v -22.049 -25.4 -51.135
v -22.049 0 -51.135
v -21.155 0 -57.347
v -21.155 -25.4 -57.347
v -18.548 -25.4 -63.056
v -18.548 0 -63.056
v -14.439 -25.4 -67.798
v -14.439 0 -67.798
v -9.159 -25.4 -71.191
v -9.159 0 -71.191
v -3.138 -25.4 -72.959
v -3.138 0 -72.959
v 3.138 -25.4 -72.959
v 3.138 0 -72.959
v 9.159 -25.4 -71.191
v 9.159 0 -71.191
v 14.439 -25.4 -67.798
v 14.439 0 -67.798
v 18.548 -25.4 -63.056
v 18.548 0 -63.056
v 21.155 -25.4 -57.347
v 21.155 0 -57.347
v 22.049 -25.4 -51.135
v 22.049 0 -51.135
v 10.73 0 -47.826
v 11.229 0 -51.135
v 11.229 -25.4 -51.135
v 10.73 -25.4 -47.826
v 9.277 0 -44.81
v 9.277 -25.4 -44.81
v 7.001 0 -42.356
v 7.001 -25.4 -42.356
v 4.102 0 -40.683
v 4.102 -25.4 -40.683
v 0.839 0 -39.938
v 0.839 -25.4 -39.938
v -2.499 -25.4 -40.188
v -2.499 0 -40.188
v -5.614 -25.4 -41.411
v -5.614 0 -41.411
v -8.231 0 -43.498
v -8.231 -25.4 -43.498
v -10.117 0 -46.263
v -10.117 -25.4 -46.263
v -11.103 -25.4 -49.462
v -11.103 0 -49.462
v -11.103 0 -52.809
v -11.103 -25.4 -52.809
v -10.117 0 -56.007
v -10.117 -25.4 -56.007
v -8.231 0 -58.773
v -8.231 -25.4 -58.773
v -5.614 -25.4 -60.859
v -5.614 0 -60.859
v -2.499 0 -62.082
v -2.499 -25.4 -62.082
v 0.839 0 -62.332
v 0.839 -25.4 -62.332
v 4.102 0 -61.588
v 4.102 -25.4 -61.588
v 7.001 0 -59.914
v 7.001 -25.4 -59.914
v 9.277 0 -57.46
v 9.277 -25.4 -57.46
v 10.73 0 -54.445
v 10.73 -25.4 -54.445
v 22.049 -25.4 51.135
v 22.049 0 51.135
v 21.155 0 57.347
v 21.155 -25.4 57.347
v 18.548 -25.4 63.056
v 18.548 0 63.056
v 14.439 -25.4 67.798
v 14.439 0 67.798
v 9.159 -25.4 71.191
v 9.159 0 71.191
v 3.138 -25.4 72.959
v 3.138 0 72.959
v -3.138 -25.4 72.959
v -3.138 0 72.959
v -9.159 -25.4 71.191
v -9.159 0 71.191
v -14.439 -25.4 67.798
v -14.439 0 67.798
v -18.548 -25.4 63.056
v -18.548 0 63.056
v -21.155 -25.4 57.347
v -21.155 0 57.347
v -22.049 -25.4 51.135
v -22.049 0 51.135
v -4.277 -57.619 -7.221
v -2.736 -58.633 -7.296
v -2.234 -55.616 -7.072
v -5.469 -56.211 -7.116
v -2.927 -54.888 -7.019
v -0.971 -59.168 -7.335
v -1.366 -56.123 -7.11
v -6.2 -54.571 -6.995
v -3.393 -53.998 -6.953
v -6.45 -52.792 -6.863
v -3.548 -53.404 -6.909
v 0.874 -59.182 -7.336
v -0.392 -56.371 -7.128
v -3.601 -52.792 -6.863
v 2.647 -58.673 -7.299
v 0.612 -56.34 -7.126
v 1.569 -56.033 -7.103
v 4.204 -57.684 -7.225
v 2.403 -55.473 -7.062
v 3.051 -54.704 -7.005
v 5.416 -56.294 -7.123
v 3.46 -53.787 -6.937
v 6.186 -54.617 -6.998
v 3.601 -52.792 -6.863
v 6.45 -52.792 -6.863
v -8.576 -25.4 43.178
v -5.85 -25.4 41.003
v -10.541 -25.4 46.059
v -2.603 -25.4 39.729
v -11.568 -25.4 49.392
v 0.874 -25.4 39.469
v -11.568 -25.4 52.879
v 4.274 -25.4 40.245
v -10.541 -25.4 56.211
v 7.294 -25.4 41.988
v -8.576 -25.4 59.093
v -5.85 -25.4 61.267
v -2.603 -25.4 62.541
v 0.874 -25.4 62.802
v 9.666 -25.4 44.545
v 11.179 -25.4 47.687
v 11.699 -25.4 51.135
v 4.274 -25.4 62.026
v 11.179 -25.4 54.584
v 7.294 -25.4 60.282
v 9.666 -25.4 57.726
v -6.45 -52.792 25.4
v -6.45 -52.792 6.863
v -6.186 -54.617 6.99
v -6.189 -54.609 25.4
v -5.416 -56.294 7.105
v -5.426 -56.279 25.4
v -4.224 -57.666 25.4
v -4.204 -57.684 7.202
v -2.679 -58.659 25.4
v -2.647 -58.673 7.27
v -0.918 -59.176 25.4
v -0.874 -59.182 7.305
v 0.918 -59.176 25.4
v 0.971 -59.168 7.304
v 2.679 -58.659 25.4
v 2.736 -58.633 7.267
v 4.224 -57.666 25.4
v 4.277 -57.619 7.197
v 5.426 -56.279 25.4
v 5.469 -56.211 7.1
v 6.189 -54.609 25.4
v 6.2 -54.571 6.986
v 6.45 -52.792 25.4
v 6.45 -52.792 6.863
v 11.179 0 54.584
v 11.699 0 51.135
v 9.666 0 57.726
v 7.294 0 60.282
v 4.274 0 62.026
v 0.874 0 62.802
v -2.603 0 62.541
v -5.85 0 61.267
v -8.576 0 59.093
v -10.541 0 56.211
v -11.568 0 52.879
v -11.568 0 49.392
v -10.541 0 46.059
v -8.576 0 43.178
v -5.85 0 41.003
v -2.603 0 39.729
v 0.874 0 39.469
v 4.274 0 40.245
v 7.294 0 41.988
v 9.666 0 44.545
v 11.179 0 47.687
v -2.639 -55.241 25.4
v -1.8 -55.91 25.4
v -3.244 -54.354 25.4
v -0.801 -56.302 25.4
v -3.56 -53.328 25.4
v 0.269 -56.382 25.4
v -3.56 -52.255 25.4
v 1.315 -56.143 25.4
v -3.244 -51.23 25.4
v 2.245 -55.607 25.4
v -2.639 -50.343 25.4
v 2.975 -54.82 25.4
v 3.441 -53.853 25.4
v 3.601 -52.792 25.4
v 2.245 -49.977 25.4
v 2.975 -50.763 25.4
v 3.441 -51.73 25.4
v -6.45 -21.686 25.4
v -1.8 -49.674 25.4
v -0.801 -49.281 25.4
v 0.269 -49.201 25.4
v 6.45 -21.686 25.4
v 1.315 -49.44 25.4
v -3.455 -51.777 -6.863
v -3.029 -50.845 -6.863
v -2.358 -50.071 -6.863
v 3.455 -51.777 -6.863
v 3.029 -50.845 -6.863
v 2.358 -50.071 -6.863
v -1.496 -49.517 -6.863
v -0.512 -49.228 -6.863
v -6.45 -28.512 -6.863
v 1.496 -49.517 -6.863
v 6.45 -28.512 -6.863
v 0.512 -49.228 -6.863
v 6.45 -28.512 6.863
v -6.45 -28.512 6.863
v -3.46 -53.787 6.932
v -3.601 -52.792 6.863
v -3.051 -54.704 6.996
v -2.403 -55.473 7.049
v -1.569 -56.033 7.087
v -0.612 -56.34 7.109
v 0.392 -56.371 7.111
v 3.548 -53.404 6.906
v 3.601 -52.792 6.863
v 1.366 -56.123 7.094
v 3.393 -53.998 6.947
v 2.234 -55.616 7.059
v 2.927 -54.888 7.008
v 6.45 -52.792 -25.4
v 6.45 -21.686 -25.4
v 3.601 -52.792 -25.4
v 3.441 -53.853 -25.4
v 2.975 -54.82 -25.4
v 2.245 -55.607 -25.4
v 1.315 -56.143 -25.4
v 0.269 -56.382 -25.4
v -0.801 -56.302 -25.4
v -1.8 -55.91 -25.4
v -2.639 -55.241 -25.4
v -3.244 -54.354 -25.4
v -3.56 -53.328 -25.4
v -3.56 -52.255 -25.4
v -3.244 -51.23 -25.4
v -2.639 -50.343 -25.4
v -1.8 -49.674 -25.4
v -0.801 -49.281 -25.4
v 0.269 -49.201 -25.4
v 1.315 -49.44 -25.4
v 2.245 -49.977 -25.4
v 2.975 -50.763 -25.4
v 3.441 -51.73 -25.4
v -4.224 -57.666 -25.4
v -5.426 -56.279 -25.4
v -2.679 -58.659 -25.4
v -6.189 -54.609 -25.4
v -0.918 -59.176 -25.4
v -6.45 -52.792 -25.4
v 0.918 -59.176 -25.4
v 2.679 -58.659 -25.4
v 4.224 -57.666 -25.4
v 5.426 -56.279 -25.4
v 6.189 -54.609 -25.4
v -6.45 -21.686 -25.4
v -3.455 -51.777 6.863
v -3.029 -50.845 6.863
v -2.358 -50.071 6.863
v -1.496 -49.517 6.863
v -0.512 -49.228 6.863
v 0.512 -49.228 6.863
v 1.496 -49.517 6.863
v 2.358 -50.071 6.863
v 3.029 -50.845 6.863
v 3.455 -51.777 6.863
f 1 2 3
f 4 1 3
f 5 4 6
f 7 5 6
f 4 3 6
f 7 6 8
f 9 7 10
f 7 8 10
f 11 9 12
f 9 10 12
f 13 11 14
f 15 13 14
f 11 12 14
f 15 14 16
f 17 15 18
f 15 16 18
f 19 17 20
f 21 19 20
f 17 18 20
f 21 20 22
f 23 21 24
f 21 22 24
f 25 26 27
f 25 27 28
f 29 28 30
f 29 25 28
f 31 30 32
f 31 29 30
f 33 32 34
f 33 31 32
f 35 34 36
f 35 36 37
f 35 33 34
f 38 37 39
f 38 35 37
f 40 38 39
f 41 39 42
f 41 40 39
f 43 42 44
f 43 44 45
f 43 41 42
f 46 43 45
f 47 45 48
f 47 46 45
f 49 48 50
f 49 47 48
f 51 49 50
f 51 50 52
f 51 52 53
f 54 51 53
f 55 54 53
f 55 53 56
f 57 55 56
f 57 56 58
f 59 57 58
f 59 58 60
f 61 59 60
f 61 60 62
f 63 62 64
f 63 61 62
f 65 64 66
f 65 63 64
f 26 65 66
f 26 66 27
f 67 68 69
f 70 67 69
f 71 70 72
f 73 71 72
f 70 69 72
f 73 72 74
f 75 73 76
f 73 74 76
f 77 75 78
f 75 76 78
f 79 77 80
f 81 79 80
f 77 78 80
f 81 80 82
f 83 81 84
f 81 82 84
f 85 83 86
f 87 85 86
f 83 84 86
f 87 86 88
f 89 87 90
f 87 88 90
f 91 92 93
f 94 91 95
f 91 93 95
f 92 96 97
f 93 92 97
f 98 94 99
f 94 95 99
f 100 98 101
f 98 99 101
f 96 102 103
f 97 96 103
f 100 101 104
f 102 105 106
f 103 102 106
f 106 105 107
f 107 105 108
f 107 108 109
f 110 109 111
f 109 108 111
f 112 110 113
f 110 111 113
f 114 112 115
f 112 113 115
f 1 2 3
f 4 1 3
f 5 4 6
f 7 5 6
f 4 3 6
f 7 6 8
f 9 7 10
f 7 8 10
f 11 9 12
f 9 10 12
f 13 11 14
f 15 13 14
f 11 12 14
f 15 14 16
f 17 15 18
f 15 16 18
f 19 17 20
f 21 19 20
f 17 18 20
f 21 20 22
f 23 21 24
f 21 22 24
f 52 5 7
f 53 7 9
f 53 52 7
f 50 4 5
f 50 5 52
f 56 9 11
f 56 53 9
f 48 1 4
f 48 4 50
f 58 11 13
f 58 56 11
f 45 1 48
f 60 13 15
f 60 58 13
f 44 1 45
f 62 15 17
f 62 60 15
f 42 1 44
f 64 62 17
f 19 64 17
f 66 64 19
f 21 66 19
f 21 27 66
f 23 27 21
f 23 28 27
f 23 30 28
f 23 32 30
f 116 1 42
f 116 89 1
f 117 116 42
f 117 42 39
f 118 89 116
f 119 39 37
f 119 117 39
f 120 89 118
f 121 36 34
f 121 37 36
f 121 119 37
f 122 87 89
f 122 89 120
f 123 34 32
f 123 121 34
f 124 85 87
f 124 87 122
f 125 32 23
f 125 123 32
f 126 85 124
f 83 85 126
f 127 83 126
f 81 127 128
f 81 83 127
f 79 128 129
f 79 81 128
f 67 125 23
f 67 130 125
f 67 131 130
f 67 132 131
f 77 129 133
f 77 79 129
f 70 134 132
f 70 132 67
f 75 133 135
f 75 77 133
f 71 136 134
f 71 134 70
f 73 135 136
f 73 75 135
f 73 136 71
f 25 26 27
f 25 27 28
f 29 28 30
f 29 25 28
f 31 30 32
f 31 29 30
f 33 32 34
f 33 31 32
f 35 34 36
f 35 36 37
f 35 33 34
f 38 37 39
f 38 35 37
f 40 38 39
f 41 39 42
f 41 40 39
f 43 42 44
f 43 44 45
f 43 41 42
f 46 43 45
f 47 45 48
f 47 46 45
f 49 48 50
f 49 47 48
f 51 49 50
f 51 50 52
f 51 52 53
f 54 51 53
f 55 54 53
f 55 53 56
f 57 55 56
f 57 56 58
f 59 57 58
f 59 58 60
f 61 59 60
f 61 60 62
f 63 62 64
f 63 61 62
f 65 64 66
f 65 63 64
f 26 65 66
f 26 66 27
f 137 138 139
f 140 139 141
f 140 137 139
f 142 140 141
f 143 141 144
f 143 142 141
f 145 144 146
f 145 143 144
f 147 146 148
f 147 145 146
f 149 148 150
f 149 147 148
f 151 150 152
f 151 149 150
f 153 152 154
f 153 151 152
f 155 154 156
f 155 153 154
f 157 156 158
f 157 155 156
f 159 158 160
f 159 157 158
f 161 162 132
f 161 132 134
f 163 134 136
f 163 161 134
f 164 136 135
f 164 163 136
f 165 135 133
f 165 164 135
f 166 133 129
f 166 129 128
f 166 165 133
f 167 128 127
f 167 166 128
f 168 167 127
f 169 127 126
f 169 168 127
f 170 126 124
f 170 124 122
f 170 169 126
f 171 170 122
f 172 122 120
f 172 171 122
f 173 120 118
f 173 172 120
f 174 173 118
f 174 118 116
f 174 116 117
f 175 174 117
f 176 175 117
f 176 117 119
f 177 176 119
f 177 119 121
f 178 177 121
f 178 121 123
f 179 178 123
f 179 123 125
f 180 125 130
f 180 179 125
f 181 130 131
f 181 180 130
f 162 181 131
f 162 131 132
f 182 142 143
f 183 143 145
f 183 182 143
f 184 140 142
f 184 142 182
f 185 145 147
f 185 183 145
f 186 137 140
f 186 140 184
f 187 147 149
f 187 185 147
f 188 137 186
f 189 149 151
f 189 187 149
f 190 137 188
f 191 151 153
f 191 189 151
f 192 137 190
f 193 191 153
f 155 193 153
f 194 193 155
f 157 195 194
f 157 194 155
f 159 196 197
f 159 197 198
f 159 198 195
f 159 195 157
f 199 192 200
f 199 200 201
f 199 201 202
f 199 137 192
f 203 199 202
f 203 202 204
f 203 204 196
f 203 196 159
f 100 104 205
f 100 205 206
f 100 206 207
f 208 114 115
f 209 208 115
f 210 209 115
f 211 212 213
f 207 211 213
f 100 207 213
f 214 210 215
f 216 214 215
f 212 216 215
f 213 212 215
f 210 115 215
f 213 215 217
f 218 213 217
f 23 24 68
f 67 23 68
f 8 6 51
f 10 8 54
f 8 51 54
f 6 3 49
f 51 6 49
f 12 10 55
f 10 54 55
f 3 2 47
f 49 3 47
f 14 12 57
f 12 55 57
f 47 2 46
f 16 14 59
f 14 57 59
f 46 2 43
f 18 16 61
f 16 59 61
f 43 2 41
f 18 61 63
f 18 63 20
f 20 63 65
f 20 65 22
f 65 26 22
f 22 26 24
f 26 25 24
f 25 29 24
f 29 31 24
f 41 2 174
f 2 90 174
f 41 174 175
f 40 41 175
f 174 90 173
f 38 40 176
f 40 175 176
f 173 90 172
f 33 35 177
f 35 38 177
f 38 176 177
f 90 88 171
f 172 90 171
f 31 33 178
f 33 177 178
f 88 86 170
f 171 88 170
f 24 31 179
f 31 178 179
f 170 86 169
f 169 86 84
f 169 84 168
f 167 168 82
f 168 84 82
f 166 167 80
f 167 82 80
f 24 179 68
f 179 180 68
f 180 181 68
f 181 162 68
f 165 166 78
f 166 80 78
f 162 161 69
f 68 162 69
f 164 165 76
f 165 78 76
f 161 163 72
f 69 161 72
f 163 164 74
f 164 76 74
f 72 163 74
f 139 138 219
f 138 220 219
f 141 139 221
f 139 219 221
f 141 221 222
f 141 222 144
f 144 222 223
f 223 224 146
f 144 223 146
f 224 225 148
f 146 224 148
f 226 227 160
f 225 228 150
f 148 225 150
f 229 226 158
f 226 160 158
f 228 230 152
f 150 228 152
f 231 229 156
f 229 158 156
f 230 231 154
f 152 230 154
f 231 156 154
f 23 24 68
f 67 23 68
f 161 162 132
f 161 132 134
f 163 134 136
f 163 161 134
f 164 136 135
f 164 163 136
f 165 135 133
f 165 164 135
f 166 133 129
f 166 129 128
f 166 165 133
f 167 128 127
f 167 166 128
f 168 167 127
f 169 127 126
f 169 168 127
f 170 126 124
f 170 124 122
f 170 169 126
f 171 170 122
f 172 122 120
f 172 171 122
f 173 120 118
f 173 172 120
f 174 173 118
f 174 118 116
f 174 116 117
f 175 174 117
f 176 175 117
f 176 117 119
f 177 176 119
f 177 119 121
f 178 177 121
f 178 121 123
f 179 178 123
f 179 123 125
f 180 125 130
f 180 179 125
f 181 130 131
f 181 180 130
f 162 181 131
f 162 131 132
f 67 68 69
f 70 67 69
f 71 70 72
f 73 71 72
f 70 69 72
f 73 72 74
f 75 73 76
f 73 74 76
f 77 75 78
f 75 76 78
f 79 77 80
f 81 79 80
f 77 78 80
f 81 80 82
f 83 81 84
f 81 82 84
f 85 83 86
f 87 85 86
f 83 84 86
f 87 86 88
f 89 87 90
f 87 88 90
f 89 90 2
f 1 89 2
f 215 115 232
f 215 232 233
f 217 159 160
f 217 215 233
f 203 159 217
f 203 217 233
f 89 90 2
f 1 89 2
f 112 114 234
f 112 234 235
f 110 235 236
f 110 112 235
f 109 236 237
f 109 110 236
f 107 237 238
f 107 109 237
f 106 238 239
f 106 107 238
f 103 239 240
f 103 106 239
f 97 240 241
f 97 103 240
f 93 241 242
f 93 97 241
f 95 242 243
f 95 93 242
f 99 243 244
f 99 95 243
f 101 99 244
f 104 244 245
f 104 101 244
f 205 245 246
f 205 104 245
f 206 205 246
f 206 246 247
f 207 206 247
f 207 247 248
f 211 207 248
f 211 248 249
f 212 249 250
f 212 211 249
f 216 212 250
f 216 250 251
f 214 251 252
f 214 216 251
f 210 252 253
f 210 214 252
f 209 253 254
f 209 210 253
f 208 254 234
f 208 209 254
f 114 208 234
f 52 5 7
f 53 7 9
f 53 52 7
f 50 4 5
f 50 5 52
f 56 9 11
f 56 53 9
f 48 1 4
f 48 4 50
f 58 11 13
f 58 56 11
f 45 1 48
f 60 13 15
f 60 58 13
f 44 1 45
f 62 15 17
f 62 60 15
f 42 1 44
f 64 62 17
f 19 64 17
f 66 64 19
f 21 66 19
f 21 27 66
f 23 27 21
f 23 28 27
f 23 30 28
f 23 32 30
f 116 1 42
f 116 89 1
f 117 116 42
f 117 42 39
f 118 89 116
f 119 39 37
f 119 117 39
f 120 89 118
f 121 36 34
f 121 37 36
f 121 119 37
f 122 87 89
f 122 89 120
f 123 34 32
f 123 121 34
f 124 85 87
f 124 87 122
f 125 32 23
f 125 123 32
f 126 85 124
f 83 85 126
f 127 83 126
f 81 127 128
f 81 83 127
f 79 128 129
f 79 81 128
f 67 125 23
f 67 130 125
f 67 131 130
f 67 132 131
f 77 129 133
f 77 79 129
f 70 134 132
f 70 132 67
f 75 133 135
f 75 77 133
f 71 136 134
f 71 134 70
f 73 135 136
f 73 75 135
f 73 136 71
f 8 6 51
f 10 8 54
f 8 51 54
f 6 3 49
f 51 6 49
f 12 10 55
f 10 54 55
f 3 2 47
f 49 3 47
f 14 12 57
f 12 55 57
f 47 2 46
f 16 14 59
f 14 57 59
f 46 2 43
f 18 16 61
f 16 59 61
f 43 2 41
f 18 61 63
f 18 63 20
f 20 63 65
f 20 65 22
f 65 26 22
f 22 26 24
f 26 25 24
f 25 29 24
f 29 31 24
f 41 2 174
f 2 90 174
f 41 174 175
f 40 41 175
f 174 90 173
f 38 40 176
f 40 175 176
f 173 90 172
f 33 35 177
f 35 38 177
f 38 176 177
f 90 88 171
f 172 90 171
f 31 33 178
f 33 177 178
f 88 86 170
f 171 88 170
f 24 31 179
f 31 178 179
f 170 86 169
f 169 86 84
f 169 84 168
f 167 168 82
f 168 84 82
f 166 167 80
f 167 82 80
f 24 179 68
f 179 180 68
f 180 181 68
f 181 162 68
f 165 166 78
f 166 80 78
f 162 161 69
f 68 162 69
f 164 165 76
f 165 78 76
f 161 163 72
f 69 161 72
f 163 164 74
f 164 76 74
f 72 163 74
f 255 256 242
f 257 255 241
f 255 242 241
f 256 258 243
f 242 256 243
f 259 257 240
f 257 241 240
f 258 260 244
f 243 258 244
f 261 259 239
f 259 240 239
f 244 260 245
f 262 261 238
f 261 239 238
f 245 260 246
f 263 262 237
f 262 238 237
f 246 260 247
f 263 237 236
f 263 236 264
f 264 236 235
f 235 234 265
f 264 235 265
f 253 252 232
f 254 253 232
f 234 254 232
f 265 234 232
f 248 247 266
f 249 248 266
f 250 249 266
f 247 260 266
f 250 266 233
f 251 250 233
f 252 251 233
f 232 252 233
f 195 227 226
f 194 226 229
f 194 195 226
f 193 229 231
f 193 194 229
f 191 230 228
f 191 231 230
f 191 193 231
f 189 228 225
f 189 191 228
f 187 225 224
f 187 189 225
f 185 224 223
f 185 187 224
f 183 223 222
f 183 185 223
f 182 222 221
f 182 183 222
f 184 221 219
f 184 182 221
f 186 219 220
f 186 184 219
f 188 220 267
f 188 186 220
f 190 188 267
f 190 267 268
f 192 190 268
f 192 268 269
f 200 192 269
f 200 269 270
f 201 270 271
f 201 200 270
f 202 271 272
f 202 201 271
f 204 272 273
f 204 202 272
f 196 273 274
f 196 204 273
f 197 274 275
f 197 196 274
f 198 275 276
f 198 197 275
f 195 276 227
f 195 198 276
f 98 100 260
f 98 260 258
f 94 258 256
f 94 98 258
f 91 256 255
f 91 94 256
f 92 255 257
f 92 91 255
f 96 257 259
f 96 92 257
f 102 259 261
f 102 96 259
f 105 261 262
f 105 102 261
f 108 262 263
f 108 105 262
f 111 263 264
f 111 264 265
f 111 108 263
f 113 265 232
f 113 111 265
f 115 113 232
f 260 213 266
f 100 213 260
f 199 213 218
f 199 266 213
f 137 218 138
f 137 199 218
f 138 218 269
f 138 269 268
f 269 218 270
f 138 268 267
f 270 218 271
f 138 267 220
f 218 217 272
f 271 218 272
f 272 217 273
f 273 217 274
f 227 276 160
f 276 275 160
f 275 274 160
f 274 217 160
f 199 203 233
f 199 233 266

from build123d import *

# Parameters (mm, degrees)
F0_R          = 11.2285119967
F0_R_2        = 11.6991288981
F2_DEPTH      = 25.4
F1_R          = 11.2285119967
F1_W          = 27.0559564233
F1_H          = 62.3726062477
F1_R_2        = 11.6991288981
F4_DEPTH      = 25.4
F4_DEPTH_BACK = 25.4
F6_DEPTH      = 25.4


with BuildPart() as f2:
    # F0 (on Front) → F2 (new body)
    with BuildSketch(Plane.XZ):
        with BuildLine():
            Line((22.0485366881, -51.1352419853), (22.0485366881, 51.1352419853))
            ThreePointArc((22.0485366881, 51.1352419853), (0, 73.1837786734), (-22.0485366881, 51.1352419853))
            Line((-22.0485366881, 51.1352419853), (-22.0485366881, -51.1352419853))
            ThreePointArc((-22.0485366881, -51.1352419853), (0, -73.1837786734), (22.0485366881, -51.1352419853))
        make_face()
        with Locations((0, -51.1352419853)):
            Circle(F0_R, mode=Mode.SUBTRACT)
        with Locations((0, 51.1352419853)):
            Circle(F0_R_2, mode=Mode.SUBTRACT)
    extrude(amount=F2_DEPTH)


with BuildPart() as f2b:
    # F1 (on face) → F2, piece 2 (new body)
    with BuildSketch(Plane.XZ):
        with BuildLine():
            ThreePointArc((-22.0485366881, -51.1352419853), (0, -73.1837786734), (22.0485366881, -51.1352419853))
            Line((22.0485366881, -51.1352419853), (22.0485366881, 51.1352419853))
            ThreePointArc((22.0485366881, 51.1352419853), (0, 73.1837786734), (-22.0485366881, 51.1352419853))
            Line((-22.0485366881, 51.1352419853), (-22.0485366881, -51.1352419853))
        make_face()
        with Locations((0, -51.1352419853)):
            Circle(F1_R, mode=Mode.SUBTRACT)
        Rectangle(F1_W, F1_H, mode=Mode.SUBTRACT)
        with Locations((0, 51.1352419853)):
            Circle(F1_R_2, mode=Mode.SUBTRACT)
        Rectangle(F1_W, F1_H)
    extrude(amount=F2_DEPTH)


with BuildPart() as f4:
    # F3 (on Top) → F4 (new body, two sides)
    with BuildSketch(Plane.XY) as f4_sk:
        with BuildLine():
            ThreePointArc((-6.4498633146, -52.7917817235), (0, -46.3419184089), (6.4498633146, -52.7917817235))
            Line((6.4498633146, -52.7917817235), (6.4498633146, -21.6856226325))
            Line((6.4498633146, -21.6856226325), (-6.4498633146, -21.6856226325))
            Line((-6.4498633146, -21.6856226325), (-6.4498633146, -52.7917817235))
        make_face()
        with BuildLine():
            Line((3.6005880685, -52.7917817235), (6.4498633146, -52.7917817235))
            ThreePointArc((6.4498633146, -52.7917817235), (0, -46.3419184089), (-6.4498633146, -52.7917817235))
            Line((-6.4498633146, -52.7917817235), (-3.6005880685, -52.7917817235))
            ThreePointArc((-3.6005880685, -52.7917817235), (0, -49.191193655), (3.6005880685, -52.7917817235))
        make_face()
        with BuildLine():
            ThreePointArc((-6.4498633146, -52.7917817235), (0, -59.2416450381), (6.4498633146, -52.7917817235))
            Line((6.4498633146, -52.7917817235), (3.6005880685, -52.7917817235))
            ThreePointArc((3.6005880685, -52.7917817235), (0, -56.392369792), (-3.6005880685, -52.7917817235))
            Line((-3.6005880685, -52.7917817235), (-6.4498633146, -52.7917817235))
        make_face()
    extrude(amount=F4_DEPTH)
    extrude(f4_sk.sketch, amount=-F4_DEPTH_BACK)

    # F5 (on face) → F6 (cut)
    with BuildSketch(Plane.YZ.offset(6.4498633146)):
        with BuildLine():
            ThreePointArc((-45.9284381941, 0), (-47.9386649722, 4.8531167513), (-52.7917817235, 6.8633435294))
            Line((-52.7917817235, 6.8633435294), (-52.7917817235, -6.8633435294))
            ThreePointArc((-52.7917817235, -6.8633435294), (-47.9386649722, -4.8531167513), (-45.9284381941, 0))
        make_face()
        with BuildLine():
            Line((-28.5119712353, 6.8633435294), (-52.7917817235, 6.8633435294))
            ThreePointArc((-52.7917817235, 6.8633435294), (-47.9386649722, 4.8531167513), (-45.9284381941, 0))
            ThreePointArc((-45.9284381941, 0), (-47.9386649722, -4.8531167513), (-52.7917817235, -6.8633435294))
            Line((-52.7917817235, -6.8633435294), (-28.5119712353, -6.8633435294))
            Line((-28.5119712353, -6.8633435294), (-28.5119712353, 6.8633435294))
        make_face()
        with BuildLine():
            Line((-52.7917817235, -6.8633435294), (-52.7917817235, 6.8633435294))
            ThreePointArc((-52.7917817235, 6.8633435294), (-57.6448984748, 4.8531167513), (-59.6551252529, 0))
            ThreePointArc((-59.6551252529, 0), (-57.6448984748, -4.8531167513), (-52.7917817235, -6.8633435294))
        make_face()
        with BuildLine():
            ThreePointArc((-59.6551252529, 0), (-57.6448984748, 4.8531167513), (-52.7917817235, 6.8633435294))
            Line((-52.7917817235, 6.8633435294), (-59.6551252529, 7.3378272355))
            Line((-59.6551252529, 7.3378272355), (-59.6551252529, 0))
        make_face()
        with BuildLine():
            Line((-59.6551252529, -7.3713026941), (-52.7917817235, -6.8633435294))
            ThreePointArc((-52.7917817235, -6.8633435294), (-57.6448984748, -4.8531167513), (-59.6551252529, 0))
            Line((-59.6551252529, 0), (-59.6551252529, -7.3713026941))
        make_face()
    extrude(amount=-F6_DEPTH, mode=Mode.SUBTRACT)


solid = Compound([f2.part, f2b.part, f4.part])
